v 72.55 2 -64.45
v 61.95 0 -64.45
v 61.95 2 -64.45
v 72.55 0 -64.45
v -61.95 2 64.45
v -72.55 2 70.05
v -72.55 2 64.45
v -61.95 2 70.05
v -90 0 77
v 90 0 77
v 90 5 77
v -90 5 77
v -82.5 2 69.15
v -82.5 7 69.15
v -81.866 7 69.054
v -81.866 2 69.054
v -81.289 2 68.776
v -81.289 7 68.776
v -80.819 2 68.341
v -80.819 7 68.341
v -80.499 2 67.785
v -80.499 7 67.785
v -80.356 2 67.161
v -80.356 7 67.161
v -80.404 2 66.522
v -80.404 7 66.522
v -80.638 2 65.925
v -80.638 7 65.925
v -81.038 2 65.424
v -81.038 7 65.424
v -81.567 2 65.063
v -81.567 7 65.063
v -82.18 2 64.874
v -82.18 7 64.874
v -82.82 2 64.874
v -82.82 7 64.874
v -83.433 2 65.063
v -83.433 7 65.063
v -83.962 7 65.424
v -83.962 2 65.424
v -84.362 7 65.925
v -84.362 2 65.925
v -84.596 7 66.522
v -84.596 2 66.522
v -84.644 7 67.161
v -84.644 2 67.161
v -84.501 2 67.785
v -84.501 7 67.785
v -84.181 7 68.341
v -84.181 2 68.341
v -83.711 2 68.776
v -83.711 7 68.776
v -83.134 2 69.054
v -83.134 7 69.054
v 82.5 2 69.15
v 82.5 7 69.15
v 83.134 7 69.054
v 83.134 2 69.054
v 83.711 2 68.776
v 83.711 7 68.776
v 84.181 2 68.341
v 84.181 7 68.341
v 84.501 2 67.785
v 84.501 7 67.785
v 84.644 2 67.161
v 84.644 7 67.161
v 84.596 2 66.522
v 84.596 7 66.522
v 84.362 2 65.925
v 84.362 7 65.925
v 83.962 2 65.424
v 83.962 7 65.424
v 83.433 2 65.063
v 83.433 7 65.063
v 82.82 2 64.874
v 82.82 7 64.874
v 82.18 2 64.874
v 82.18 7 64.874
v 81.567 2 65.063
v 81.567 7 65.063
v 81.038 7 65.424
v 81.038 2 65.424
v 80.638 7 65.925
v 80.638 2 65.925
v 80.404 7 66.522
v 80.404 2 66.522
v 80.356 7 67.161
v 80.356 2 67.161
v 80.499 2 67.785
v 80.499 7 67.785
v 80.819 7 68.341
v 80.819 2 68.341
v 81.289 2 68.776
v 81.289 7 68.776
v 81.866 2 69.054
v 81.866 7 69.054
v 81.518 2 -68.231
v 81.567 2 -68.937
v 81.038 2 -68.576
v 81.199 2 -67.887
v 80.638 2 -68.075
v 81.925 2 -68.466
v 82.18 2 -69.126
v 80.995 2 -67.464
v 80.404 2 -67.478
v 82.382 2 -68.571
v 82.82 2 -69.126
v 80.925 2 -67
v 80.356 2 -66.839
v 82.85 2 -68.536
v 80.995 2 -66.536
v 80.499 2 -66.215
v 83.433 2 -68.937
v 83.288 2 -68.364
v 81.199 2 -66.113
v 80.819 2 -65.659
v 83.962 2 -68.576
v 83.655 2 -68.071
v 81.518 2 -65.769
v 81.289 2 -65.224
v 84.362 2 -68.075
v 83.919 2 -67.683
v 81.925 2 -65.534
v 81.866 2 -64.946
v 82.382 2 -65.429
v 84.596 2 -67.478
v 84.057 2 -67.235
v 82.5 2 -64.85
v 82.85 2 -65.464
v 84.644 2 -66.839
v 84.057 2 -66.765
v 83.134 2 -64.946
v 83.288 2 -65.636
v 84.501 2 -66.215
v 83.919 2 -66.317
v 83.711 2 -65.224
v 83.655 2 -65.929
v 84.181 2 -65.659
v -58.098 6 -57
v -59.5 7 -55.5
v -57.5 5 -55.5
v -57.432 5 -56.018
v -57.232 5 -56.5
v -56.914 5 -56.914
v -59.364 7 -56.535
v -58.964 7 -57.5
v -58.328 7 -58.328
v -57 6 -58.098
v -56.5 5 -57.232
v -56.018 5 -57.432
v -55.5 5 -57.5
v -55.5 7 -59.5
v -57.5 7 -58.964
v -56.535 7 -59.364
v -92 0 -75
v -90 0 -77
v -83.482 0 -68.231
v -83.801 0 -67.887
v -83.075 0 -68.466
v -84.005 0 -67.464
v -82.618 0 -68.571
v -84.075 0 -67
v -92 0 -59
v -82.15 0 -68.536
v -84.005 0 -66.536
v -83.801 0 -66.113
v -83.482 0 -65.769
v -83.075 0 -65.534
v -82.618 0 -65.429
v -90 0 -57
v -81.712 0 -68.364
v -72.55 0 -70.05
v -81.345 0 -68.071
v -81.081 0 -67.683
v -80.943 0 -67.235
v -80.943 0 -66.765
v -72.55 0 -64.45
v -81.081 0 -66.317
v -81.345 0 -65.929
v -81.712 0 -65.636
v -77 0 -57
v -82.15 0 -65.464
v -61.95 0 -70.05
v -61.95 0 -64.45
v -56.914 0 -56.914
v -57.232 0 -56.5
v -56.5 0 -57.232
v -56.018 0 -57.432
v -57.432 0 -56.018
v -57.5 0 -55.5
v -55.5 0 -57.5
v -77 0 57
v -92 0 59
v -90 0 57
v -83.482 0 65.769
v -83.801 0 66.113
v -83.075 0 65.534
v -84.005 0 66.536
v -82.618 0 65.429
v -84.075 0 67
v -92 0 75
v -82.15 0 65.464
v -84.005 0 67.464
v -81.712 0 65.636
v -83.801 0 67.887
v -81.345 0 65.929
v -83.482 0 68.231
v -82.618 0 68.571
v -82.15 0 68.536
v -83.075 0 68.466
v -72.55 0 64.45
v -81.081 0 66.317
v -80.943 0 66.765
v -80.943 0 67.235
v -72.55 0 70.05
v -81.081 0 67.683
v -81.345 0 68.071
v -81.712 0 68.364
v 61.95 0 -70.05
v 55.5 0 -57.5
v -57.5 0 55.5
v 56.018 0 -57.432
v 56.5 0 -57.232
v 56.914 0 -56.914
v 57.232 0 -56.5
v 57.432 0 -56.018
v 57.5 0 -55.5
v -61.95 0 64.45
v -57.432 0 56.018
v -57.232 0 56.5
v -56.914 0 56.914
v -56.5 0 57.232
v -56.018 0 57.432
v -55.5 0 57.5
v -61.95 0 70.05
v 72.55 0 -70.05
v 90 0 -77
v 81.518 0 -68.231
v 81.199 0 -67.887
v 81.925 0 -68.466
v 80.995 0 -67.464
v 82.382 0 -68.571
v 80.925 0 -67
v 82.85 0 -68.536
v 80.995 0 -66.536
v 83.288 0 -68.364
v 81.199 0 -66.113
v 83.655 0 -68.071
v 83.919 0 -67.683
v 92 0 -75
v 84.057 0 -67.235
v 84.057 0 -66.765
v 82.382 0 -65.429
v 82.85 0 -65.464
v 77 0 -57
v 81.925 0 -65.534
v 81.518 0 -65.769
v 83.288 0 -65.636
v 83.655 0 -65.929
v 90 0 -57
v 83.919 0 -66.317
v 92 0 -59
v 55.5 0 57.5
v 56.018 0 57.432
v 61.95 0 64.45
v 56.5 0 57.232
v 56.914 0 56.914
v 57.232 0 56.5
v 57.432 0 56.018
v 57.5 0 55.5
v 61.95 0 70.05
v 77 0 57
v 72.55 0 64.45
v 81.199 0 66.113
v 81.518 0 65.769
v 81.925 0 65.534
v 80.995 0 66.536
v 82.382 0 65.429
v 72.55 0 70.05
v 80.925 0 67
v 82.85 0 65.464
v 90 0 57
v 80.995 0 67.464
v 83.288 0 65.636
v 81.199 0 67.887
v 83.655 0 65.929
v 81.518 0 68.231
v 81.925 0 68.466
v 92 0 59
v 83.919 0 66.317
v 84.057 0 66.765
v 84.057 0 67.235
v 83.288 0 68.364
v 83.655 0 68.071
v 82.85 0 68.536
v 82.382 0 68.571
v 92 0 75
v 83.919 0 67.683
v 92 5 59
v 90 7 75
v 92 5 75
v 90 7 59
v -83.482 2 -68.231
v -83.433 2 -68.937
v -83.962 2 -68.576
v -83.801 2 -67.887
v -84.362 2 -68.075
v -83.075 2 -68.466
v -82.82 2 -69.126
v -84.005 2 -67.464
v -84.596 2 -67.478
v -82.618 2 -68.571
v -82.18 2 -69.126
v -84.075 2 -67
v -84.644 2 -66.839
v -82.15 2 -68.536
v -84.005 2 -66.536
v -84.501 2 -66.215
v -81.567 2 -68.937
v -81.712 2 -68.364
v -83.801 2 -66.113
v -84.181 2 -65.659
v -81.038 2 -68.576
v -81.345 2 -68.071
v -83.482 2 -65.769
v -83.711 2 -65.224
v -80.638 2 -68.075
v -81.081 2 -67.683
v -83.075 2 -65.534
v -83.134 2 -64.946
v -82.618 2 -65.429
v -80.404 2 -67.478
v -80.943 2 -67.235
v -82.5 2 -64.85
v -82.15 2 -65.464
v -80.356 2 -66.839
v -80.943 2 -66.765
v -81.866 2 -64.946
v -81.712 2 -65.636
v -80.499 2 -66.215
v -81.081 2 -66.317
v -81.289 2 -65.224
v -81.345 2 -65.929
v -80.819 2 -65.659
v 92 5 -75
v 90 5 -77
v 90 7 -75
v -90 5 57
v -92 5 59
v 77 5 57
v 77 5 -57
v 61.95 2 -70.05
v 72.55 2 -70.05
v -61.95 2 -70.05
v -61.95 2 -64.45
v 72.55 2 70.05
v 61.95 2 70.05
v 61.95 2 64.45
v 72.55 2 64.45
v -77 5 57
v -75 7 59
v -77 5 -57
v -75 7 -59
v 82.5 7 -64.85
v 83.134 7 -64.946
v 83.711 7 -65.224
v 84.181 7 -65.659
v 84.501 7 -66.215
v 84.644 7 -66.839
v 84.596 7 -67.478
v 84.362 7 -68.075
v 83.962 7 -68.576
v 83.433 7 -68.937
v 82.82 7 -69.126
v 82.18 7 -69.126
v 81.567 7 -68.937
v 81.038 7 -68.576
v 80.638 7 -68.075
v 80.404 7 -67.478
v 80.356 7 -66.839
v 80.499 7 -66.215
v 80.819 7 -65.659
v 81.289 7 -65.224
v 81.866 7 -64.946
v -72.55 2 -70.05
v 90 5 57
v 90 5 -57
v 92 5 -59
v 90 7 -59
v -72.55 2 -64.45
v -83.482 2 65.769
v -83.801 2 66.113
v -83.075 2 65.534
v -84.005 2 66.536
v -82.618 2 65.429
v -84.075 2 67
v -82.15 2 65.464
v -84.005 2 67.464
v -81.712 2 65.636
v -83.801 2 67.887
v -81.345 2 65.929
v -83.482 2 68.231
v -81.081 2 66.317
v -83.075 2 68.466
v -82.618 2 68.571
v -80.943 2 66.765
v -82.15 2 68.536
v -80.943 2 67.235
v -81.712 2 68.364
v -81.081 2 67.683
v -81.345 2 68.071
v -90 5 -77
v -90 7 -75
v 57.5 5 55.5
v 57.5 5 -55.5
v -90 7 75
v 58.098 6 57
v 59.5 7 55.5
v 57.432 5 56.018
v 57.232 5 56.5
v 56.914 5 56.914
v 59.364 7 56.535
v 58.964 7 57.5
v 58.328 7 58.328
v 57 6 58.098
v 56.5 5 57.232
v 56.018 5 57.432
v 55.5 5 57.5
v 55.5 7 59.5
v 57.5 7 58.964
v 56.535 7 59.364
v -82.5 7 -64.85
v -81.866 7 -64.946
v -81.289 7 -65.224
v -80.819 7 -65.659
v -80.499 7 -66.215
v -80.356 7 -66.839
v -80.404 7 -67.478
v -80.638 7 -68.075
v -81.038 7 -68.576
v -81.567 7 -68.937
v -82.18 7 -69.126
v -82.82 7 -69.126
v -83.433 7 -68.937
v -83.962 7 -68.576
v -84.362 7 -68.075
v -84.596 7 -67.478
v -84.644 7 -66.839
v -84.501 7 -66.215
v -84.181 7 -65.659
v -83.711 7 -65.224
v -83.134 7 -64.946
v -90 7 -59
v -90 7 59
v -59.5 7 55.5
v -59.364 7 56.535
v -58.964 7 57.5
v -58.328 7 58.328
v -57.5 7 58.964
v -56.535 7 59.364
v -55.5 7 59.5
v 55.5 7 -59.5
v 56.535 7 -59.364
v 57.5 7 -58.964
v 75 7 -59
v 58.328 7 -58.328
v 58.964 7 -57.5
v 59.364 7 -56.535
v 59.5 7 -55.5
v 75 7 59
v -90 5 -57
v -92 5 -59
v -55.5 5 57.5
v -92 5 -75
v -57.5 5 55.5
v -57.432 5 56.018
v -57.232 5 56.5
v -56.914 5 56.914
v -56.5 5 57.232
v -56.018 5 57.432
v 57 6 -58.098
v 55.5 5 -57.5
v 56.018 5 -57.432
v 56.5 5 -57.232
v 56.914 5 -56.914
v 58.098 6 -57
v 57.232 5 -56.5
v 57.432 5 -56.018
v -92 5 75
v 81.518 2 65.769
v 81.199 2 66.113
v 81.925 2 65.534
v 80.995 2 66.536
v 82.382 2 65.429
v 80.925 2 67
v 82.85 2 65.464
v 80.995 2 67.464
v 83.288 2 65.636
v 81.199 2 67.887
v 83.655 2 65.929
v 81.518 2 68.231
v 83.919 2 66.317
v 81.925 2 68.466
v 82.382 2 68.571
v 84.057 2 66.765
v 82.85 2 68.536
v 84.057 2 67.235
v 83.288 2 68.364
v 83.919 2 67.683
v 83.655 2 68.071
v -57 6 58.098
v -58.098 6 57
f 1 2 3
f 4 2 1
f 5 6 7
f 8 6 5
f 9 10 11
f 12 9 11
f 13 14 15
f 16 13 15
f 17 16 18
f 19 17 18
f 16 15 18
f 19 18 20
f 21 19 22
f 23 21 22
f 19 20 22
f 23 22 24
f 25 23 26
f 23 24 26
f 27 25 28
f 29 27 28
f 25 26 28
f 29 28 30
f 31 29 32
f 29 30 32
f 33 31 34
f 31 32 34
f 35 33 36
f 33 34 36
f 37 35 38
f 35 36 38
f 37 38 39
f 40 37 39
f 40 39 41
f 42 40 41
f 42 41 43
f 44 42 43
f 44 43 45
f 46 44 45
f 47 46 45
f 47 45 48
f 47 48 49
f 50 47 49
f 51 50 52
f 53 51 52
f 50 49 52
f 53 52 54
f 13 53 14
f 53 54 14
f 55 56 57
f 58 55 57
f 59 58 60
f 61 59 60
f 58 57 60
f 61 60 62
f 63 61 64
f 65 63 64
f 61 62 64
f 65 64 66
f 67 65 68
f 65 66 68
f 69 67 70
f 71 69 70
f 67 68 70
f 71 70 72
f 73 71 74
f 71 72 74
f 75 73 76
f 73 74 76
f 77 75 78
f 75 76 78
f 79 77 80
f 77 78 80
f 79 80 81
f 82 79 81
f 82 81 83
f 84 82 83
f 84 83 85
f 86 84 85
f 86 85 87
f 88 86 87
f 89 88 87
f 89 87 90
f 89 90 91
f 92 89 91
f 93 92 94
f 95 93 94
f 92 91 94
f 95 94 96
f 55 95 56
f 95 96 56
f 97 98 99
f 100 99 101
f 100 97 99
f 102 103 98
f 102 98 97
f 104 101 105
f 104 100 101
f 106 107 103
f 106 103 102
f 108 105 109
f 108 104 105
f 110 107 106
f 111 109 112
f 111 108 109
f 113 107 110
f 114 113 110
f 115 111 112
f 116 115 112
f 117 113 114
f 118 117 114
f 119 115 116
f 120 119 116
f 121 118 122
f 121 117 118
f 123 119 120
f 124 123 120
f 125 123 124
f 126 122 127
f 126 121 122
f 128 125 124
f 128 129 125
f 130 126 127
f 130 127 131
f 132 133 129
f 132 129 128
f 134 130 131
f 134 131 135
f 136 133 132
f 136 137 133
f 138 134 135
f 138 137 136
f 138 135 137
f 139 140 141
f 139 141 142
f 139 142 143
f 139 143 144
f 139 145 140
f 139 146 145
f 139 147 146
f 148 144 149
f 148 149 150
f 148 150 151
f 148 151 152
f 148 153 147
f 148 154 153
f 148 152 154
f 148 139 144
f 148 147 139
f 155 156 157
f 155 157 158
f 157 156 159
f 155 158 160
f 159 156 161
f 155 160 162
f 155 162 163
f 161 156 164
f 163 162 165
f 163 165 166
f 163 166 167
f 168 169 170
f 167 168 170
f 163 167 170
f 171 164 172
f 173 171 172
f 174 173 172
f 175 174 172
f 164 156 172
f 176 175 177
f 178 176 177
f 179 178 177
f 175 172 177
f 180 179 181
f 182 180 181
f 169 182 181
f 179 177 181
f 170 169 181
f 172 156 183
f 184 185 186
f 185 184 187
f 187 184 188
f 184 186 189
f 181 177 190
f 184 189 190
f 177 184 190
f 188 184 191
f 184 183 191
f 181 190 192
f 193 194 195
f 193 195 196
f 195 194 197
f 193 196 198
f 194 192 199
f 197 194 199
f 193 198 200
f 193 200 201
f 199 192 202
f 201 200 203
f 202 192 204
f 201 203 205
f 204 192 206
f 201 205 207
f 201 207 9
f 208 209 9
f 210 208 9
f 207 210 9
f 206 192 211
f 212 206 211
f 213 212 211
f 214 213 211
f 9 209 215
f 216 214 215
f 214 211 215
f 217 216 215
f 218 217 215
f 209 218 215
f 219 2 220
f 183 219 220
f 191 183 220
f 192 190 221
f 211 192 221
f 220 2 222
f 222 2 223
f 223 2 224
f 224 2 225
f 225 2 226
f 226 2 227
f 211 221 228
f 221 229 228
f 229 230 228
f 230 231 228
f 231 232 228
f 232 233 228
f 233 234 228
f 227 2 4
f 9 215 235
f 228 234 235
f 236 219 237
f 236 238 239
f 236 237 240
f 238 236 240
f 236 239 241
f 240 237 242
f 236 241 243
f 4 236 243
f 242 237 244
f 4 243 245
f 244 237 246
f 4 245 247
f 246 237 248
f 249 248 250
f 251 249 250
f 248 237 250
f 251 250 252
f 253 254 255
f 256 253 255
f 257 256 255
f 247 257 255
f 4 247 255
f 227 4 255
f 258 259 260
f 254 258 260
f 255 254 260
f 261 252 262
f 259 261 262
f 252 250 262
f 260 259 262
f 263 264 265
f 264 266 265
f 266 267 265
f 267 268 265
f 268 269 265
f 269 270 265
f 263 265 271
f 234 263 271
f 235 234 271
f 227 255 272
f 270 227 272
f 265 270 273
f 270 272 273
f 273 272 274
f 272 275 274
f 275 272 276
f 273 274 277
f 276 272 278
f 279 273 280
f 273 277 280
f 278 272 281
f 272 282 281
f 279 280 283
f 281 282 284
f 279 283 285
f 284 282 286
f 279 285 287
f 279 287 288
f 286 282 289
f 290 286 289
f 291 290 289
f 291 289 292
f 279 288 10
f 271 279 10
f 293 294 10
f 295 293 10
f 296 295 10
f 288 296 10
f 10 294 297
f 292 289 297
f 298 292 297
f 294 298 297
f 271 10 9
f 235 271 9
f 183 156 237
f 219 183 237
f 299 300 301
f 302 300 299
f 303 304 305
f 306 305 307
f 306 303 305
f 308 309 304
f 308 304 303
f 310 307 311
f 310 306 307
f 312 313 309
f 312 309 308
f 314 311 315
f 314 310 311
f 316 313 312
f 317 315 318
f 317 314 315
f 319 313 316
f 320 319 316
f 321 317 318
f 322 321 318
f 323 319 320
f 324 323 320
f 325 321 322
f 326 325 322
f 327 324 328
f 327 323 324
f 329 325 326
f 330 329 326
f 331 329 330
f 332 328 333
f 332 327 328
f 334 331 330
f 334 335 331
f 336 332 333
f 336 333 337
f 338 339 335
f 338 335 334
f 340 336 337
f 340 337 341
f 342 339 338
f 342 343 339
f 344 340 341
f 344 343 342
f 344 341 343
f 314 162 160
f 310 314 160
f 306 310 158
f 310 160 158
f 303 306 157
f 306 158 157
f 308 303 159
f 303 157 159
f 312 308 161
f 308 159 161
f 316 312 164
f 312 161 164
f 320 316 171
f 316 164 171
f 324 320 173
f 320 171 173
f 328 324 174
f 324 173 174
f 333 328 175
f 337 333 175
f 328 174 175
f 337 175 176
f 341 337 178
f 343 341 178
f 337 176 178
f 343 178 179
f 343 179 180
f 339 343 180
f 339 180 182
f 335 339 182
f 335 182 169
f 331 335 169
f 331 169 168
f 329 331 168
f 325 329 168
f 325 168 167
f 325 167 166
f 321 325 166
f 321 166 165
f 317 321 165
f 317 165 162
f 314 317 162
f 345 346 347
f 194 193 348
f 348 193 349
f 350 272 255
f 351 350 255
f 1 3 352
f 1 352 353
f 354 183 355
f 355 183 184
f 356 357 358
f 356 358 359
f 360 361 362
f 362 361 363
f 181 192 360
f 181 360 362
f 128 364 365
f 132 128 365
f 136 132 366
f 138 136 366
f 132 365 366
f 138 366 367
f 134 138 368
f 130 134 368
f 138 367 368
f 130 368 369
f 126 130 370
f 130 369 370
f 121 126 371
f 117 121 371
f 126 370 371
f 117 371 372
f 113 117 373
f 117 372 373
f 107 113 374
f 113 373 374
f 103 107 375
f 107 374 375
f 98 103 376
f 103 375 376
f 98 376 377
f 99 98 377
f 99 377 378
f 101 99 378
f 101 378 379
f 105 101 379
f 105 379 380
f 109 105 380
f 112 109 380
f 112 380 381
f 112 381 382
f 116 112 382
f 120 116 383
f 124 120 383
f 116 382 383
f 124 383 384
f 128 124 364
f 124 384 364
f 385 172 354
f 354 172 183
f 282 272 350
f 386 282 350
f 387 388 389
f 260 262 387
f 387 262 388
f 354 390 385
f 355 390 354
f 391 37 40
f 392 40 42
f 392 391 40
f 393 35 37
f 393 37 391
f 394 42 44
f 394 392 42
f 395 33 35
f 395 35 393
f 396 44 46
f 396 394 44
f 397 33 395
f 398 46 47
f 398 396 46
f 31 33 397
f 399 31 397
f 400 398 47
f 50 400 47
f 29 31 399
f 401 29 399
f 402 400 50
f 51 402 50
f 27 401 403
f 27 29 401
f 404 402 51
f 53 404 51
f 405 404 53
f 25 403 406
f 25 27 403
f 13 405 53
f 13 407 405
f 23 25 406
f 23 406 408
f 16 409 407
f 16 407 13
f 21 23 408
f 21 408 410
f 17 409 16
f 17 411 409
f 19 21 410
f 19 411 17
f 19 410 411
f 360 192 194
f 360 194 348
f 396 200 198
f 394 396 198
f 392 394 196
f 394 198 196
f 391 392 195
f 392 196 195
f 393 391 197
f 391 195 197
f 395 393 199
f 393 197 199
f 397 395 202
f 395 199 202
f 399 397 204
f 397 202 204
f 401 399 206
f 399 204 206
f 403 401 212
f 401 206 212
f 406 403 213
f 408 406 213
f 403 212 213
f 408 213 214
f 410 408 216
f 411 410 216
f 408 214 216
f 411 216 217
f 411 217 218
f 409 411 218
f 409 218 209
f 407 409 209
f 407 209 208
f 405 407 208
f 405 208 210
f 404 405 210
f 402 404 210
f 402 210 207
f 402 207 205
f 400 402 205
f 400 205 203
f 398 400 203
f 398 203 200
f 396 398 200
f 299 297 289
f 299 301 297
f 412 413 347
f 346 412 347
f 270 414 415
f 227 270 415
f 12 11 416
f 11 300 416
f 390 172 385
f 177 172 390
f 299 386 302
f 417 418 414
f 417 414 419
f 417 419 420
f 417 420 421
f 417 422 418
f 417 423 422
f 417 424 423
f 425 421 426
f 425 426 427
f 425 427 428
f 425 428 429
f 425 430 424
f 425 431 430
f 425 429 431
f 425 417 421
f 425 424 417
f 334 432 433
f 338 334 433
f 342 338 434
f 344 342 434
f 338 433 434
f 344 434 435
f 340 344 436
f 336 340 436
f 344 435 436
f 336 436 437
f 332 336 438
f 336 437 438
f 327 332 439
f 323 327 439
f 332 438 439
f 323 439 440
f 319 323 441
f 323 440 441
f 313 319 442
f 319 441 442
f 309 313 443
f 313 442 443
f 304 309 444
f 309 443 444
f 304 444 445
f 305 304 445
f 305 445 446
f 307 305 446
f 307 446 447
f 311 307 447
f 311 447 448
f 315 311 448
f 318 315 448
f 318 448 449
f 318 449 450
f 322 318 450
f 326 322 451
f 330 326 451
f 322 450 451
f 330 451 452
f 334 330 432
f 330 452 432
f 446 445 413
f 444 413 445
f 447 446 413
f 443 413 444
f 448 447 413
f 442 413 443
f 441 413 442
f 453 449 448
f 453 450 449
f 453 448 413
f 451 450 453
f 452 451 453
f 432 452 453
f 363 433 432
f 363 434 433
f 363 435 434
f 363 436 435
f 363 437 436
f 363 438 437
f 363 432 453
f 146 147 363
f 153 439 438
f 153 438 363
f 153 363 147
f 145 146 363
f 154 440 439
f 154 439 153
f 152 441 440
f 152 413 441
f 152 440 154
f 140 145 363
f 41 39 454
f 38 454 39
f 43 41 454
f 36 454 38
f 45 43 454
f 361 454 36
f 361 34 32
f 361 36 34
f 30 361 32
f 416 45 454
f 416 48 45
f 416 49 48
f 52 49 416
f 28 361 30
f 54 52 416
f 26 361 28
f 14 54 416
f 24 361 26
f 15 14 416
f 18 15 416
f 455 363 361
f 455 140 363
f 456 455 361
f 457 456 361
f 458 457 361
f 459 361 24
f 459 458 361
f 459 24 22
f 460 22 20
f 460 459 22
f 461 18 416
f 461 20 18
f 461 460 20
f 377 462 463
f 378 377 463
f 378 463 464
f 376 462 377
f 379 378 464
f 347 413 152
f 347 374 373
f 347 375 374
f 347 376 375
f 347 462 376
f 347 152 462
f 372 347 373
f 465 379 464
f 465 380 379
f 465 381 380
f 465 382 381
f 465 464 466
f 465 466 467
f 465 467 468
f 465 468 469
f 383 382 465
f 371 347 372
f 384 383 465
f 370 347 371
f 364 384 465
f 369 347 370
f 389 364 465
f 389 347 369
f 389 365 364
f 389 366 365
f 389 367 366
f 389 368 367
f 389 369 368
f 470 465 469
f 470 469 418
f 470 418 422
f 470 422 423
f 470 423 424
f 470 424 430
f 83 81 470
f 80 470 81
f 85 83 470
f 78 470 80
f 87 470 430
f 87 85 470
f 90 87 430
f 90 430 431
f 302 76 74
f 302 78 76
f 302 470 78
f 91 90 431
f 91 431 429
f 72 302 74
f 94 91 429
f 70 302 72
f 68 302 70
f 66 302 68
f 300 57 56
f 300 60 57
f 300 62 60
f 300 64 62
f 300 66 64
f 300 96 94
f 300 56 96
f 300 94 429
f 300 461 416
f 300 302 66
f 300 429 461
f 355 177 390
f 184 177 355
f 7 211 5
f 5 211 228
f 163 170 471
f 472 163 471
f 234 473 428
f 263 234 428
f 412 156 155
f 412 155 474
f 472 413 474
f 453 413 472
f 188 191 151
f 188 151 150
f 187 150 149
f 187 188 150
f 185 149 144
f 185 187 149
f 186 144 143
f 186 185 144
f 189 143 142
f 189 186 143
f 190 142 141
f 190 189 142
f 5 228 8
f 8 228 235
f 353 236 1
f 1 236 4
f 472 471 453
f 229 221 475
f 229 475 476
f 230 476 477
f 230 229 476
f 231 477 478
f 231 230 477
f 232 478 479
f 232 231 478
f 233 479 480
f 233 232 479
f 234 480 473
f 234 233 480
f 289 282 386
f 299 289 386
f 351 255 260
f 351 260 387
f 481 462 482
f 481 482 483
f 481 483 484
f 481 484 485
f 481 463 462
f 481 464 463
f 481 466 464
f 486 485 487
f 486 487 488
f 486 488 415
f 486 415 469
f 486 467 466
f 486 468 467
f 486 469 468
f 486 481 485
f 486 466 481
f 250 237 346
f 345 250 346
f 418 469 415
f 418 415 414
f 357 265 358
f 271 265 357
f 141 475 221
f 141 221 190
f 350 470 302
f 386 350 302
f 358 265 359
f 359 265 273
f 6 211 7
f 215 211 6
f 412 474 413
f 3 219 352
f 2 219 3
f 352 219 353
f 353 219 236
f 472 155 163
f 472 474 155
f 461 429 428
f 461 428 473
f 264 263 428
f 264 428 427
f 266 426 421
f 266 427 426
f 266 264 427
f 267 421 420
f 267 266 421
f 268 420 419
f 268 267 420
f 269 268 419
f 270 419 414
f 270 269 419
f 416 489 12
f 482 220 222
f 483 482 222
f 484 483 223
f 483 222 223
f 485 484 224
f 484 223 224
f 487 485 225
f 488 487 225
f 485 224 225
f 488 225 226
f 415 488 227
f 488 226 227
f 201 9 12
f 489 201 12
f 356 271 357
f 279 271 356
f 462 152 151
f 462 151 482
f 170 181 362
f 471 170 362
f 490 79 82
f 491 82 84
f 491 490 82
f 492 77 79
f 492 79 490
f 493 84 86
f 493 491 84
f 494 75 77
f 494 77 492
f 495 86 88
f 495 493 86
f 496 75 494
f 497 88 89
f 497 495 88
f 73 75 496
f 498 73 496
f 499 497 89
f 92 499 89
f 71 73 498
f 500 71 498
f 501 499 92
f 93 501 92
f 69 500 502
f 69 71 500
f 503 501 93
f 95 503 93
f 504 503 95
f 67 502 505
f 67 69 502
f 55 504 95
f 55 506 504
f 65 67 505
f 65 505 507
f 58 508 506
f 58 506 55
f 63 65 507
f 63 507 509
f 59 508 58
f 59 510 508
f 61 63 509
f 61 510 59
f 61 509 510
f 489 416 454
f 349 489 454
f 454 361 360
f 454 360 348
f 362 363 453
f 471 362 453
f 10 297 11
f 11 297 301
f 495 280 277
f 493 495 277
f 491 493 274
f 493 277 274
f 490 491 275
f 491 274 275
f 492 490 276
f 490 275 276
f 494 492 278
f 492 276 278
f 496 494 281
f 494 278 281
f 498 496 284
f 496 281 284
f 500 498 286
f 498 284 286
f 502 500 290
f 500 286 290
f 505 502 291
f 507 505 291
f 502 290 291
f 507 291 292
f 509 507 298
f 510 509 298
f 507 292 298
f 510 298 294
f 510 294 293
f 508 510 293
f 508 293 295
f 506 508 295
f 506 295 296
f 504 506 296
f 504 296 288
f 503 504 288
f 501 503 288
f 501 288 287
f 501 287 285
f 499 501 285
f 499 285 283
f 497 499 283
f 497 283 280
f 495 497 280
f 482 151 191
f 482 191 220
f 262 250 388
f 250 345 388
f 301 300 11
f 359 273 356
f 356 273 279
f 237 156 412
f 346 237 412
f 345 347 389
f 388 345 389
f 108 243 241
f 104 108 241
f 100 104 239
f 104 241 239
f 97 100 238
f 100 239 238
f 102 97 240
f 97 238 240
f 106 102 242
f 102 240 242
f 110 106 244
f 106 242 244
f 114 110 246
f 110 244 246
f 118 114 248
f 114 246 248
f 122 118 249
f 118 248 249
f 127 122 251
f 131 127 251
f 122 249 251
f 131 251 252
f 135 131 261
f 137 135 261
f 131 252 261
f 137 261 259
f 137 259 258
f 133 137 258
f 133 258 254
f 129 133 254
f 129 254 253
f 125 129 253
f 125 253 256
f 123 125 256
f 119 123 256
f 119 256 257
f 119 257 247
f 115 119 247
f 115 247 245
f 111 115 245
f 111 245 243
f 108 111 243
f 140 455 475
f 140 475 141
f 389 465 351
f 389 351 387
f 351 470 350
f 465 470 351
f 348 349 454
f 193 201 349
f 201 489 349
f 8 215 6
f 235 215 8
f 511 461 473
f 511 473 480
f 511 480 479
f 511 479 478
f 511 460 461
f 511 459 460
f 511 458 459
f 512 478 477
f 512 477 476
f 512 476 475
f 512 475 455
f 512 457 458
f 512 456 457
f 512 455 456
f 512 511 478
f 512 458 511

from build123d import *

# Parameters (mm, degrees)
SKETCH_1_W               = 154
SKETCH_1_H               = 154
EXTRUDE_1_DEPTH          = 7
SKETCH_7_W               = 10.6
SKETCH_7_H               = 5.6
CUT_EXTRUDE_2_DEPTH      = 2
SKETCH_8_W               = 115
SKETCH_8_H               = 115
CUT_EXTRUDE_3_DEPTH      = 110.119200877
SKETCH_11_W              = 20
SKETCH_11_H              = 7
EXTRUDE_6_DEPTH          = 15
MIRROR_6_COPY_1_SKETCH_W = 20
MIRROR_6_COPY_1_SKETCH_H = 7
MIRROR_6_COPY_1_DEPTH    = 15
FILLET_6_R               = 2
CHAMFER_5_SIZE           = 2
HOLE_WIZARD_M31_D        = 3.15
SKETCH_14_R              = 2.15
CUT_EXTRUDE_4_DEPTH      = 5


with BuildPart() as part:
    # Эскиз1 → Бобышка-Вытянуть1 (new body)
    with BuildSketch(Plane(origin=(0, 0, 0), x_dir=(1, 0, 0), z_dir=(0, 1, 0))):
        Rectangle(SKETCH_1_W, SKETCH_1_H)
    extrude(amount=EXTRUDE_1_DEPTH)

    # Эскиз7 → Вырез-Вытянуть2 (cut)
    with BuildSketch(Plane.XZ):
        with Locations((-67.25, 67.25)):
            Rectangle(SKETCH_7_W, SKETCH_7_H)
        with Locations((67.25, 67.25)):
            Rectangle(SKETCH_7_W, SKETCH_7_H)
        with Locations((-67.25, -67.25)):
            Rectangle(SKETCH_7_W, SKETCH_7_H)
        with Locations((67.25, -67.25)):
            Rectangle(SKETCH_7_W, SKETCH_7_H)
    extrude(amount=-CUT_EXTRUDE_2_DEPTH, mode=Mode.SUBTRACT)

    # Эскиз8 → Вырез-Вытянуть3 (cut, through all)
    with BuildSketch(Plane(origin=(0, 7, 0), x_dir=(1, 0, 0), z_dir=(0, 1, 0))):
        Rectangle(SKETCH_8_W, SKETCH_8_H)
    extrude(amount=-CUT_EXTRUDE_3_DEPTH, mode=Mode.SUBTRACT)

    # Эскиз11 → Бобышка-Вытянуть6 (add)
    with BuildSketch(Plane(origin=(77, 0, 0), x_dir=(0, 0, -1), z_dir=(1, 0, 0))):
        with Locations((-67, 3.5)):
            Rectangle(SKETCH_11_W, SKETCH_11_H)
    extrude_6 = extrude(amount=EXTRUDE_6_DEPTH)

    # Зеркальное отражение5: Бобышка-Вытянуть6 across plane
    add(extrude_6.mirror(Plane.XY))

    # Зеркальное отражение6: Бобышка-Вытянуть6 across plane
    add(extrude_6.mirror(Plane(origin=(0, 0, 0), x_dir=(0, 0, 1), z_dir=(1, 0, 0))))

    # Зеркальное отражение6 copy 1 sketch → Зеркальное отражение6 copy 1 (add)
    with BuildSketch(Plane.ZY.offset(77)):
        with Locations((-67, 3.5)):
            Rectangle(MIRROR_6_COPY_1_SKETCH_W, MIRROR_6_COPY_1_SKETCH_H)
    extrude(amount=MIRROR_6_COPY_1_DEPTH)

    # Скругление6
    fillet_6_edges = [part.edges().sort_by_distance(p)[0] for p in [
        (57.5, 3.5, -57.5),
        (57.5, 3.5, 57.5),
        (-57.5, 3.5, 57.5),
        (-57.5, 3.5, -57.5),
    ]]
    fillet(fillet_6_edges, radius=FILLET_6_R)

    # Chamfer 5
    chamfer_5_edges = [part.edges().sort_by_distance(p)[0] for p in [
        (-92, 3.5, 77),
        (-92, 7, 67),
        (-92, 3.5, 57),
        (-84.5, 7, 57),
        (-77, 7, 0),
        (-84.5, 7, -57),
        (-92, 3.5, -57),
        (-92, 7, -67),
        (-92, 3.5, -77),
        (0, 7, -57.5),
        (57.5, 7, 0),
        (0, 7, 57.5),
        (-57.5, 7, 0),
        (56.914213562, 7, -56.914213562),
        (56.914213562, 7, 56.914213562),
        (-56.914213562, 7, -56.914213562),
        (-56.914213562, 7, 56.914213562),
        (0, 7, 77),
        (77, 7, 0),
        (84.5, 7, 57),
        (92, 3.5, 57),
        (92, 7, 67),
        (92, 3.5, 77),
        (0, 7, -77),
        (92, 3.5, -77),
        (92, 7, -67),
        (92, 3.5, -57),
        (84.5, 7, -57),
    ]]
    chamfer(chamfer_5_edges, length=CHAMFER_5_SIZE)

    # Сверло под метчик  спиральное M31 (through all)
    with Locations(Plane(origin=(0, 7, 0), x_dir=(1, 0, 0), z_dir=(0, 1, 0))):
        with Locations((82.5, -67), (-82.5, 67), (82.5, 67), (-82.5, -67)):
            Hole(HOLE_WIZARD_M31_D / 2)

    # Эскиз14 → Вырез-Вытянуть4 (cut)
    with BuildSketch(Plane(origin=(0, 7, 0), x_dir=(1, 0, 0), z_dir=(0, 1, 0))):
        with Locations(Location((-82.5, 67, 0), (0, 0, 270))):
            Circle(SKETCH_14_R)
        with Locations(Location((82.5, 67, 0), (0, 0, 270))):
            Circle(SKETCH_14_R)
        with Locations(Location((-82.5, -67, 0), (0, 0, 270))):
            Circle(SKETCH_14_R)
        with Locations(Location((82.5, -67, 0), (0, 0, 270))):
            Circle(SKETCH_14_R)
    extrude(amount=-CUT_EXTRUDE_4_DEPTH, mode=Mode.SUBTRACT)


solid = part.part
